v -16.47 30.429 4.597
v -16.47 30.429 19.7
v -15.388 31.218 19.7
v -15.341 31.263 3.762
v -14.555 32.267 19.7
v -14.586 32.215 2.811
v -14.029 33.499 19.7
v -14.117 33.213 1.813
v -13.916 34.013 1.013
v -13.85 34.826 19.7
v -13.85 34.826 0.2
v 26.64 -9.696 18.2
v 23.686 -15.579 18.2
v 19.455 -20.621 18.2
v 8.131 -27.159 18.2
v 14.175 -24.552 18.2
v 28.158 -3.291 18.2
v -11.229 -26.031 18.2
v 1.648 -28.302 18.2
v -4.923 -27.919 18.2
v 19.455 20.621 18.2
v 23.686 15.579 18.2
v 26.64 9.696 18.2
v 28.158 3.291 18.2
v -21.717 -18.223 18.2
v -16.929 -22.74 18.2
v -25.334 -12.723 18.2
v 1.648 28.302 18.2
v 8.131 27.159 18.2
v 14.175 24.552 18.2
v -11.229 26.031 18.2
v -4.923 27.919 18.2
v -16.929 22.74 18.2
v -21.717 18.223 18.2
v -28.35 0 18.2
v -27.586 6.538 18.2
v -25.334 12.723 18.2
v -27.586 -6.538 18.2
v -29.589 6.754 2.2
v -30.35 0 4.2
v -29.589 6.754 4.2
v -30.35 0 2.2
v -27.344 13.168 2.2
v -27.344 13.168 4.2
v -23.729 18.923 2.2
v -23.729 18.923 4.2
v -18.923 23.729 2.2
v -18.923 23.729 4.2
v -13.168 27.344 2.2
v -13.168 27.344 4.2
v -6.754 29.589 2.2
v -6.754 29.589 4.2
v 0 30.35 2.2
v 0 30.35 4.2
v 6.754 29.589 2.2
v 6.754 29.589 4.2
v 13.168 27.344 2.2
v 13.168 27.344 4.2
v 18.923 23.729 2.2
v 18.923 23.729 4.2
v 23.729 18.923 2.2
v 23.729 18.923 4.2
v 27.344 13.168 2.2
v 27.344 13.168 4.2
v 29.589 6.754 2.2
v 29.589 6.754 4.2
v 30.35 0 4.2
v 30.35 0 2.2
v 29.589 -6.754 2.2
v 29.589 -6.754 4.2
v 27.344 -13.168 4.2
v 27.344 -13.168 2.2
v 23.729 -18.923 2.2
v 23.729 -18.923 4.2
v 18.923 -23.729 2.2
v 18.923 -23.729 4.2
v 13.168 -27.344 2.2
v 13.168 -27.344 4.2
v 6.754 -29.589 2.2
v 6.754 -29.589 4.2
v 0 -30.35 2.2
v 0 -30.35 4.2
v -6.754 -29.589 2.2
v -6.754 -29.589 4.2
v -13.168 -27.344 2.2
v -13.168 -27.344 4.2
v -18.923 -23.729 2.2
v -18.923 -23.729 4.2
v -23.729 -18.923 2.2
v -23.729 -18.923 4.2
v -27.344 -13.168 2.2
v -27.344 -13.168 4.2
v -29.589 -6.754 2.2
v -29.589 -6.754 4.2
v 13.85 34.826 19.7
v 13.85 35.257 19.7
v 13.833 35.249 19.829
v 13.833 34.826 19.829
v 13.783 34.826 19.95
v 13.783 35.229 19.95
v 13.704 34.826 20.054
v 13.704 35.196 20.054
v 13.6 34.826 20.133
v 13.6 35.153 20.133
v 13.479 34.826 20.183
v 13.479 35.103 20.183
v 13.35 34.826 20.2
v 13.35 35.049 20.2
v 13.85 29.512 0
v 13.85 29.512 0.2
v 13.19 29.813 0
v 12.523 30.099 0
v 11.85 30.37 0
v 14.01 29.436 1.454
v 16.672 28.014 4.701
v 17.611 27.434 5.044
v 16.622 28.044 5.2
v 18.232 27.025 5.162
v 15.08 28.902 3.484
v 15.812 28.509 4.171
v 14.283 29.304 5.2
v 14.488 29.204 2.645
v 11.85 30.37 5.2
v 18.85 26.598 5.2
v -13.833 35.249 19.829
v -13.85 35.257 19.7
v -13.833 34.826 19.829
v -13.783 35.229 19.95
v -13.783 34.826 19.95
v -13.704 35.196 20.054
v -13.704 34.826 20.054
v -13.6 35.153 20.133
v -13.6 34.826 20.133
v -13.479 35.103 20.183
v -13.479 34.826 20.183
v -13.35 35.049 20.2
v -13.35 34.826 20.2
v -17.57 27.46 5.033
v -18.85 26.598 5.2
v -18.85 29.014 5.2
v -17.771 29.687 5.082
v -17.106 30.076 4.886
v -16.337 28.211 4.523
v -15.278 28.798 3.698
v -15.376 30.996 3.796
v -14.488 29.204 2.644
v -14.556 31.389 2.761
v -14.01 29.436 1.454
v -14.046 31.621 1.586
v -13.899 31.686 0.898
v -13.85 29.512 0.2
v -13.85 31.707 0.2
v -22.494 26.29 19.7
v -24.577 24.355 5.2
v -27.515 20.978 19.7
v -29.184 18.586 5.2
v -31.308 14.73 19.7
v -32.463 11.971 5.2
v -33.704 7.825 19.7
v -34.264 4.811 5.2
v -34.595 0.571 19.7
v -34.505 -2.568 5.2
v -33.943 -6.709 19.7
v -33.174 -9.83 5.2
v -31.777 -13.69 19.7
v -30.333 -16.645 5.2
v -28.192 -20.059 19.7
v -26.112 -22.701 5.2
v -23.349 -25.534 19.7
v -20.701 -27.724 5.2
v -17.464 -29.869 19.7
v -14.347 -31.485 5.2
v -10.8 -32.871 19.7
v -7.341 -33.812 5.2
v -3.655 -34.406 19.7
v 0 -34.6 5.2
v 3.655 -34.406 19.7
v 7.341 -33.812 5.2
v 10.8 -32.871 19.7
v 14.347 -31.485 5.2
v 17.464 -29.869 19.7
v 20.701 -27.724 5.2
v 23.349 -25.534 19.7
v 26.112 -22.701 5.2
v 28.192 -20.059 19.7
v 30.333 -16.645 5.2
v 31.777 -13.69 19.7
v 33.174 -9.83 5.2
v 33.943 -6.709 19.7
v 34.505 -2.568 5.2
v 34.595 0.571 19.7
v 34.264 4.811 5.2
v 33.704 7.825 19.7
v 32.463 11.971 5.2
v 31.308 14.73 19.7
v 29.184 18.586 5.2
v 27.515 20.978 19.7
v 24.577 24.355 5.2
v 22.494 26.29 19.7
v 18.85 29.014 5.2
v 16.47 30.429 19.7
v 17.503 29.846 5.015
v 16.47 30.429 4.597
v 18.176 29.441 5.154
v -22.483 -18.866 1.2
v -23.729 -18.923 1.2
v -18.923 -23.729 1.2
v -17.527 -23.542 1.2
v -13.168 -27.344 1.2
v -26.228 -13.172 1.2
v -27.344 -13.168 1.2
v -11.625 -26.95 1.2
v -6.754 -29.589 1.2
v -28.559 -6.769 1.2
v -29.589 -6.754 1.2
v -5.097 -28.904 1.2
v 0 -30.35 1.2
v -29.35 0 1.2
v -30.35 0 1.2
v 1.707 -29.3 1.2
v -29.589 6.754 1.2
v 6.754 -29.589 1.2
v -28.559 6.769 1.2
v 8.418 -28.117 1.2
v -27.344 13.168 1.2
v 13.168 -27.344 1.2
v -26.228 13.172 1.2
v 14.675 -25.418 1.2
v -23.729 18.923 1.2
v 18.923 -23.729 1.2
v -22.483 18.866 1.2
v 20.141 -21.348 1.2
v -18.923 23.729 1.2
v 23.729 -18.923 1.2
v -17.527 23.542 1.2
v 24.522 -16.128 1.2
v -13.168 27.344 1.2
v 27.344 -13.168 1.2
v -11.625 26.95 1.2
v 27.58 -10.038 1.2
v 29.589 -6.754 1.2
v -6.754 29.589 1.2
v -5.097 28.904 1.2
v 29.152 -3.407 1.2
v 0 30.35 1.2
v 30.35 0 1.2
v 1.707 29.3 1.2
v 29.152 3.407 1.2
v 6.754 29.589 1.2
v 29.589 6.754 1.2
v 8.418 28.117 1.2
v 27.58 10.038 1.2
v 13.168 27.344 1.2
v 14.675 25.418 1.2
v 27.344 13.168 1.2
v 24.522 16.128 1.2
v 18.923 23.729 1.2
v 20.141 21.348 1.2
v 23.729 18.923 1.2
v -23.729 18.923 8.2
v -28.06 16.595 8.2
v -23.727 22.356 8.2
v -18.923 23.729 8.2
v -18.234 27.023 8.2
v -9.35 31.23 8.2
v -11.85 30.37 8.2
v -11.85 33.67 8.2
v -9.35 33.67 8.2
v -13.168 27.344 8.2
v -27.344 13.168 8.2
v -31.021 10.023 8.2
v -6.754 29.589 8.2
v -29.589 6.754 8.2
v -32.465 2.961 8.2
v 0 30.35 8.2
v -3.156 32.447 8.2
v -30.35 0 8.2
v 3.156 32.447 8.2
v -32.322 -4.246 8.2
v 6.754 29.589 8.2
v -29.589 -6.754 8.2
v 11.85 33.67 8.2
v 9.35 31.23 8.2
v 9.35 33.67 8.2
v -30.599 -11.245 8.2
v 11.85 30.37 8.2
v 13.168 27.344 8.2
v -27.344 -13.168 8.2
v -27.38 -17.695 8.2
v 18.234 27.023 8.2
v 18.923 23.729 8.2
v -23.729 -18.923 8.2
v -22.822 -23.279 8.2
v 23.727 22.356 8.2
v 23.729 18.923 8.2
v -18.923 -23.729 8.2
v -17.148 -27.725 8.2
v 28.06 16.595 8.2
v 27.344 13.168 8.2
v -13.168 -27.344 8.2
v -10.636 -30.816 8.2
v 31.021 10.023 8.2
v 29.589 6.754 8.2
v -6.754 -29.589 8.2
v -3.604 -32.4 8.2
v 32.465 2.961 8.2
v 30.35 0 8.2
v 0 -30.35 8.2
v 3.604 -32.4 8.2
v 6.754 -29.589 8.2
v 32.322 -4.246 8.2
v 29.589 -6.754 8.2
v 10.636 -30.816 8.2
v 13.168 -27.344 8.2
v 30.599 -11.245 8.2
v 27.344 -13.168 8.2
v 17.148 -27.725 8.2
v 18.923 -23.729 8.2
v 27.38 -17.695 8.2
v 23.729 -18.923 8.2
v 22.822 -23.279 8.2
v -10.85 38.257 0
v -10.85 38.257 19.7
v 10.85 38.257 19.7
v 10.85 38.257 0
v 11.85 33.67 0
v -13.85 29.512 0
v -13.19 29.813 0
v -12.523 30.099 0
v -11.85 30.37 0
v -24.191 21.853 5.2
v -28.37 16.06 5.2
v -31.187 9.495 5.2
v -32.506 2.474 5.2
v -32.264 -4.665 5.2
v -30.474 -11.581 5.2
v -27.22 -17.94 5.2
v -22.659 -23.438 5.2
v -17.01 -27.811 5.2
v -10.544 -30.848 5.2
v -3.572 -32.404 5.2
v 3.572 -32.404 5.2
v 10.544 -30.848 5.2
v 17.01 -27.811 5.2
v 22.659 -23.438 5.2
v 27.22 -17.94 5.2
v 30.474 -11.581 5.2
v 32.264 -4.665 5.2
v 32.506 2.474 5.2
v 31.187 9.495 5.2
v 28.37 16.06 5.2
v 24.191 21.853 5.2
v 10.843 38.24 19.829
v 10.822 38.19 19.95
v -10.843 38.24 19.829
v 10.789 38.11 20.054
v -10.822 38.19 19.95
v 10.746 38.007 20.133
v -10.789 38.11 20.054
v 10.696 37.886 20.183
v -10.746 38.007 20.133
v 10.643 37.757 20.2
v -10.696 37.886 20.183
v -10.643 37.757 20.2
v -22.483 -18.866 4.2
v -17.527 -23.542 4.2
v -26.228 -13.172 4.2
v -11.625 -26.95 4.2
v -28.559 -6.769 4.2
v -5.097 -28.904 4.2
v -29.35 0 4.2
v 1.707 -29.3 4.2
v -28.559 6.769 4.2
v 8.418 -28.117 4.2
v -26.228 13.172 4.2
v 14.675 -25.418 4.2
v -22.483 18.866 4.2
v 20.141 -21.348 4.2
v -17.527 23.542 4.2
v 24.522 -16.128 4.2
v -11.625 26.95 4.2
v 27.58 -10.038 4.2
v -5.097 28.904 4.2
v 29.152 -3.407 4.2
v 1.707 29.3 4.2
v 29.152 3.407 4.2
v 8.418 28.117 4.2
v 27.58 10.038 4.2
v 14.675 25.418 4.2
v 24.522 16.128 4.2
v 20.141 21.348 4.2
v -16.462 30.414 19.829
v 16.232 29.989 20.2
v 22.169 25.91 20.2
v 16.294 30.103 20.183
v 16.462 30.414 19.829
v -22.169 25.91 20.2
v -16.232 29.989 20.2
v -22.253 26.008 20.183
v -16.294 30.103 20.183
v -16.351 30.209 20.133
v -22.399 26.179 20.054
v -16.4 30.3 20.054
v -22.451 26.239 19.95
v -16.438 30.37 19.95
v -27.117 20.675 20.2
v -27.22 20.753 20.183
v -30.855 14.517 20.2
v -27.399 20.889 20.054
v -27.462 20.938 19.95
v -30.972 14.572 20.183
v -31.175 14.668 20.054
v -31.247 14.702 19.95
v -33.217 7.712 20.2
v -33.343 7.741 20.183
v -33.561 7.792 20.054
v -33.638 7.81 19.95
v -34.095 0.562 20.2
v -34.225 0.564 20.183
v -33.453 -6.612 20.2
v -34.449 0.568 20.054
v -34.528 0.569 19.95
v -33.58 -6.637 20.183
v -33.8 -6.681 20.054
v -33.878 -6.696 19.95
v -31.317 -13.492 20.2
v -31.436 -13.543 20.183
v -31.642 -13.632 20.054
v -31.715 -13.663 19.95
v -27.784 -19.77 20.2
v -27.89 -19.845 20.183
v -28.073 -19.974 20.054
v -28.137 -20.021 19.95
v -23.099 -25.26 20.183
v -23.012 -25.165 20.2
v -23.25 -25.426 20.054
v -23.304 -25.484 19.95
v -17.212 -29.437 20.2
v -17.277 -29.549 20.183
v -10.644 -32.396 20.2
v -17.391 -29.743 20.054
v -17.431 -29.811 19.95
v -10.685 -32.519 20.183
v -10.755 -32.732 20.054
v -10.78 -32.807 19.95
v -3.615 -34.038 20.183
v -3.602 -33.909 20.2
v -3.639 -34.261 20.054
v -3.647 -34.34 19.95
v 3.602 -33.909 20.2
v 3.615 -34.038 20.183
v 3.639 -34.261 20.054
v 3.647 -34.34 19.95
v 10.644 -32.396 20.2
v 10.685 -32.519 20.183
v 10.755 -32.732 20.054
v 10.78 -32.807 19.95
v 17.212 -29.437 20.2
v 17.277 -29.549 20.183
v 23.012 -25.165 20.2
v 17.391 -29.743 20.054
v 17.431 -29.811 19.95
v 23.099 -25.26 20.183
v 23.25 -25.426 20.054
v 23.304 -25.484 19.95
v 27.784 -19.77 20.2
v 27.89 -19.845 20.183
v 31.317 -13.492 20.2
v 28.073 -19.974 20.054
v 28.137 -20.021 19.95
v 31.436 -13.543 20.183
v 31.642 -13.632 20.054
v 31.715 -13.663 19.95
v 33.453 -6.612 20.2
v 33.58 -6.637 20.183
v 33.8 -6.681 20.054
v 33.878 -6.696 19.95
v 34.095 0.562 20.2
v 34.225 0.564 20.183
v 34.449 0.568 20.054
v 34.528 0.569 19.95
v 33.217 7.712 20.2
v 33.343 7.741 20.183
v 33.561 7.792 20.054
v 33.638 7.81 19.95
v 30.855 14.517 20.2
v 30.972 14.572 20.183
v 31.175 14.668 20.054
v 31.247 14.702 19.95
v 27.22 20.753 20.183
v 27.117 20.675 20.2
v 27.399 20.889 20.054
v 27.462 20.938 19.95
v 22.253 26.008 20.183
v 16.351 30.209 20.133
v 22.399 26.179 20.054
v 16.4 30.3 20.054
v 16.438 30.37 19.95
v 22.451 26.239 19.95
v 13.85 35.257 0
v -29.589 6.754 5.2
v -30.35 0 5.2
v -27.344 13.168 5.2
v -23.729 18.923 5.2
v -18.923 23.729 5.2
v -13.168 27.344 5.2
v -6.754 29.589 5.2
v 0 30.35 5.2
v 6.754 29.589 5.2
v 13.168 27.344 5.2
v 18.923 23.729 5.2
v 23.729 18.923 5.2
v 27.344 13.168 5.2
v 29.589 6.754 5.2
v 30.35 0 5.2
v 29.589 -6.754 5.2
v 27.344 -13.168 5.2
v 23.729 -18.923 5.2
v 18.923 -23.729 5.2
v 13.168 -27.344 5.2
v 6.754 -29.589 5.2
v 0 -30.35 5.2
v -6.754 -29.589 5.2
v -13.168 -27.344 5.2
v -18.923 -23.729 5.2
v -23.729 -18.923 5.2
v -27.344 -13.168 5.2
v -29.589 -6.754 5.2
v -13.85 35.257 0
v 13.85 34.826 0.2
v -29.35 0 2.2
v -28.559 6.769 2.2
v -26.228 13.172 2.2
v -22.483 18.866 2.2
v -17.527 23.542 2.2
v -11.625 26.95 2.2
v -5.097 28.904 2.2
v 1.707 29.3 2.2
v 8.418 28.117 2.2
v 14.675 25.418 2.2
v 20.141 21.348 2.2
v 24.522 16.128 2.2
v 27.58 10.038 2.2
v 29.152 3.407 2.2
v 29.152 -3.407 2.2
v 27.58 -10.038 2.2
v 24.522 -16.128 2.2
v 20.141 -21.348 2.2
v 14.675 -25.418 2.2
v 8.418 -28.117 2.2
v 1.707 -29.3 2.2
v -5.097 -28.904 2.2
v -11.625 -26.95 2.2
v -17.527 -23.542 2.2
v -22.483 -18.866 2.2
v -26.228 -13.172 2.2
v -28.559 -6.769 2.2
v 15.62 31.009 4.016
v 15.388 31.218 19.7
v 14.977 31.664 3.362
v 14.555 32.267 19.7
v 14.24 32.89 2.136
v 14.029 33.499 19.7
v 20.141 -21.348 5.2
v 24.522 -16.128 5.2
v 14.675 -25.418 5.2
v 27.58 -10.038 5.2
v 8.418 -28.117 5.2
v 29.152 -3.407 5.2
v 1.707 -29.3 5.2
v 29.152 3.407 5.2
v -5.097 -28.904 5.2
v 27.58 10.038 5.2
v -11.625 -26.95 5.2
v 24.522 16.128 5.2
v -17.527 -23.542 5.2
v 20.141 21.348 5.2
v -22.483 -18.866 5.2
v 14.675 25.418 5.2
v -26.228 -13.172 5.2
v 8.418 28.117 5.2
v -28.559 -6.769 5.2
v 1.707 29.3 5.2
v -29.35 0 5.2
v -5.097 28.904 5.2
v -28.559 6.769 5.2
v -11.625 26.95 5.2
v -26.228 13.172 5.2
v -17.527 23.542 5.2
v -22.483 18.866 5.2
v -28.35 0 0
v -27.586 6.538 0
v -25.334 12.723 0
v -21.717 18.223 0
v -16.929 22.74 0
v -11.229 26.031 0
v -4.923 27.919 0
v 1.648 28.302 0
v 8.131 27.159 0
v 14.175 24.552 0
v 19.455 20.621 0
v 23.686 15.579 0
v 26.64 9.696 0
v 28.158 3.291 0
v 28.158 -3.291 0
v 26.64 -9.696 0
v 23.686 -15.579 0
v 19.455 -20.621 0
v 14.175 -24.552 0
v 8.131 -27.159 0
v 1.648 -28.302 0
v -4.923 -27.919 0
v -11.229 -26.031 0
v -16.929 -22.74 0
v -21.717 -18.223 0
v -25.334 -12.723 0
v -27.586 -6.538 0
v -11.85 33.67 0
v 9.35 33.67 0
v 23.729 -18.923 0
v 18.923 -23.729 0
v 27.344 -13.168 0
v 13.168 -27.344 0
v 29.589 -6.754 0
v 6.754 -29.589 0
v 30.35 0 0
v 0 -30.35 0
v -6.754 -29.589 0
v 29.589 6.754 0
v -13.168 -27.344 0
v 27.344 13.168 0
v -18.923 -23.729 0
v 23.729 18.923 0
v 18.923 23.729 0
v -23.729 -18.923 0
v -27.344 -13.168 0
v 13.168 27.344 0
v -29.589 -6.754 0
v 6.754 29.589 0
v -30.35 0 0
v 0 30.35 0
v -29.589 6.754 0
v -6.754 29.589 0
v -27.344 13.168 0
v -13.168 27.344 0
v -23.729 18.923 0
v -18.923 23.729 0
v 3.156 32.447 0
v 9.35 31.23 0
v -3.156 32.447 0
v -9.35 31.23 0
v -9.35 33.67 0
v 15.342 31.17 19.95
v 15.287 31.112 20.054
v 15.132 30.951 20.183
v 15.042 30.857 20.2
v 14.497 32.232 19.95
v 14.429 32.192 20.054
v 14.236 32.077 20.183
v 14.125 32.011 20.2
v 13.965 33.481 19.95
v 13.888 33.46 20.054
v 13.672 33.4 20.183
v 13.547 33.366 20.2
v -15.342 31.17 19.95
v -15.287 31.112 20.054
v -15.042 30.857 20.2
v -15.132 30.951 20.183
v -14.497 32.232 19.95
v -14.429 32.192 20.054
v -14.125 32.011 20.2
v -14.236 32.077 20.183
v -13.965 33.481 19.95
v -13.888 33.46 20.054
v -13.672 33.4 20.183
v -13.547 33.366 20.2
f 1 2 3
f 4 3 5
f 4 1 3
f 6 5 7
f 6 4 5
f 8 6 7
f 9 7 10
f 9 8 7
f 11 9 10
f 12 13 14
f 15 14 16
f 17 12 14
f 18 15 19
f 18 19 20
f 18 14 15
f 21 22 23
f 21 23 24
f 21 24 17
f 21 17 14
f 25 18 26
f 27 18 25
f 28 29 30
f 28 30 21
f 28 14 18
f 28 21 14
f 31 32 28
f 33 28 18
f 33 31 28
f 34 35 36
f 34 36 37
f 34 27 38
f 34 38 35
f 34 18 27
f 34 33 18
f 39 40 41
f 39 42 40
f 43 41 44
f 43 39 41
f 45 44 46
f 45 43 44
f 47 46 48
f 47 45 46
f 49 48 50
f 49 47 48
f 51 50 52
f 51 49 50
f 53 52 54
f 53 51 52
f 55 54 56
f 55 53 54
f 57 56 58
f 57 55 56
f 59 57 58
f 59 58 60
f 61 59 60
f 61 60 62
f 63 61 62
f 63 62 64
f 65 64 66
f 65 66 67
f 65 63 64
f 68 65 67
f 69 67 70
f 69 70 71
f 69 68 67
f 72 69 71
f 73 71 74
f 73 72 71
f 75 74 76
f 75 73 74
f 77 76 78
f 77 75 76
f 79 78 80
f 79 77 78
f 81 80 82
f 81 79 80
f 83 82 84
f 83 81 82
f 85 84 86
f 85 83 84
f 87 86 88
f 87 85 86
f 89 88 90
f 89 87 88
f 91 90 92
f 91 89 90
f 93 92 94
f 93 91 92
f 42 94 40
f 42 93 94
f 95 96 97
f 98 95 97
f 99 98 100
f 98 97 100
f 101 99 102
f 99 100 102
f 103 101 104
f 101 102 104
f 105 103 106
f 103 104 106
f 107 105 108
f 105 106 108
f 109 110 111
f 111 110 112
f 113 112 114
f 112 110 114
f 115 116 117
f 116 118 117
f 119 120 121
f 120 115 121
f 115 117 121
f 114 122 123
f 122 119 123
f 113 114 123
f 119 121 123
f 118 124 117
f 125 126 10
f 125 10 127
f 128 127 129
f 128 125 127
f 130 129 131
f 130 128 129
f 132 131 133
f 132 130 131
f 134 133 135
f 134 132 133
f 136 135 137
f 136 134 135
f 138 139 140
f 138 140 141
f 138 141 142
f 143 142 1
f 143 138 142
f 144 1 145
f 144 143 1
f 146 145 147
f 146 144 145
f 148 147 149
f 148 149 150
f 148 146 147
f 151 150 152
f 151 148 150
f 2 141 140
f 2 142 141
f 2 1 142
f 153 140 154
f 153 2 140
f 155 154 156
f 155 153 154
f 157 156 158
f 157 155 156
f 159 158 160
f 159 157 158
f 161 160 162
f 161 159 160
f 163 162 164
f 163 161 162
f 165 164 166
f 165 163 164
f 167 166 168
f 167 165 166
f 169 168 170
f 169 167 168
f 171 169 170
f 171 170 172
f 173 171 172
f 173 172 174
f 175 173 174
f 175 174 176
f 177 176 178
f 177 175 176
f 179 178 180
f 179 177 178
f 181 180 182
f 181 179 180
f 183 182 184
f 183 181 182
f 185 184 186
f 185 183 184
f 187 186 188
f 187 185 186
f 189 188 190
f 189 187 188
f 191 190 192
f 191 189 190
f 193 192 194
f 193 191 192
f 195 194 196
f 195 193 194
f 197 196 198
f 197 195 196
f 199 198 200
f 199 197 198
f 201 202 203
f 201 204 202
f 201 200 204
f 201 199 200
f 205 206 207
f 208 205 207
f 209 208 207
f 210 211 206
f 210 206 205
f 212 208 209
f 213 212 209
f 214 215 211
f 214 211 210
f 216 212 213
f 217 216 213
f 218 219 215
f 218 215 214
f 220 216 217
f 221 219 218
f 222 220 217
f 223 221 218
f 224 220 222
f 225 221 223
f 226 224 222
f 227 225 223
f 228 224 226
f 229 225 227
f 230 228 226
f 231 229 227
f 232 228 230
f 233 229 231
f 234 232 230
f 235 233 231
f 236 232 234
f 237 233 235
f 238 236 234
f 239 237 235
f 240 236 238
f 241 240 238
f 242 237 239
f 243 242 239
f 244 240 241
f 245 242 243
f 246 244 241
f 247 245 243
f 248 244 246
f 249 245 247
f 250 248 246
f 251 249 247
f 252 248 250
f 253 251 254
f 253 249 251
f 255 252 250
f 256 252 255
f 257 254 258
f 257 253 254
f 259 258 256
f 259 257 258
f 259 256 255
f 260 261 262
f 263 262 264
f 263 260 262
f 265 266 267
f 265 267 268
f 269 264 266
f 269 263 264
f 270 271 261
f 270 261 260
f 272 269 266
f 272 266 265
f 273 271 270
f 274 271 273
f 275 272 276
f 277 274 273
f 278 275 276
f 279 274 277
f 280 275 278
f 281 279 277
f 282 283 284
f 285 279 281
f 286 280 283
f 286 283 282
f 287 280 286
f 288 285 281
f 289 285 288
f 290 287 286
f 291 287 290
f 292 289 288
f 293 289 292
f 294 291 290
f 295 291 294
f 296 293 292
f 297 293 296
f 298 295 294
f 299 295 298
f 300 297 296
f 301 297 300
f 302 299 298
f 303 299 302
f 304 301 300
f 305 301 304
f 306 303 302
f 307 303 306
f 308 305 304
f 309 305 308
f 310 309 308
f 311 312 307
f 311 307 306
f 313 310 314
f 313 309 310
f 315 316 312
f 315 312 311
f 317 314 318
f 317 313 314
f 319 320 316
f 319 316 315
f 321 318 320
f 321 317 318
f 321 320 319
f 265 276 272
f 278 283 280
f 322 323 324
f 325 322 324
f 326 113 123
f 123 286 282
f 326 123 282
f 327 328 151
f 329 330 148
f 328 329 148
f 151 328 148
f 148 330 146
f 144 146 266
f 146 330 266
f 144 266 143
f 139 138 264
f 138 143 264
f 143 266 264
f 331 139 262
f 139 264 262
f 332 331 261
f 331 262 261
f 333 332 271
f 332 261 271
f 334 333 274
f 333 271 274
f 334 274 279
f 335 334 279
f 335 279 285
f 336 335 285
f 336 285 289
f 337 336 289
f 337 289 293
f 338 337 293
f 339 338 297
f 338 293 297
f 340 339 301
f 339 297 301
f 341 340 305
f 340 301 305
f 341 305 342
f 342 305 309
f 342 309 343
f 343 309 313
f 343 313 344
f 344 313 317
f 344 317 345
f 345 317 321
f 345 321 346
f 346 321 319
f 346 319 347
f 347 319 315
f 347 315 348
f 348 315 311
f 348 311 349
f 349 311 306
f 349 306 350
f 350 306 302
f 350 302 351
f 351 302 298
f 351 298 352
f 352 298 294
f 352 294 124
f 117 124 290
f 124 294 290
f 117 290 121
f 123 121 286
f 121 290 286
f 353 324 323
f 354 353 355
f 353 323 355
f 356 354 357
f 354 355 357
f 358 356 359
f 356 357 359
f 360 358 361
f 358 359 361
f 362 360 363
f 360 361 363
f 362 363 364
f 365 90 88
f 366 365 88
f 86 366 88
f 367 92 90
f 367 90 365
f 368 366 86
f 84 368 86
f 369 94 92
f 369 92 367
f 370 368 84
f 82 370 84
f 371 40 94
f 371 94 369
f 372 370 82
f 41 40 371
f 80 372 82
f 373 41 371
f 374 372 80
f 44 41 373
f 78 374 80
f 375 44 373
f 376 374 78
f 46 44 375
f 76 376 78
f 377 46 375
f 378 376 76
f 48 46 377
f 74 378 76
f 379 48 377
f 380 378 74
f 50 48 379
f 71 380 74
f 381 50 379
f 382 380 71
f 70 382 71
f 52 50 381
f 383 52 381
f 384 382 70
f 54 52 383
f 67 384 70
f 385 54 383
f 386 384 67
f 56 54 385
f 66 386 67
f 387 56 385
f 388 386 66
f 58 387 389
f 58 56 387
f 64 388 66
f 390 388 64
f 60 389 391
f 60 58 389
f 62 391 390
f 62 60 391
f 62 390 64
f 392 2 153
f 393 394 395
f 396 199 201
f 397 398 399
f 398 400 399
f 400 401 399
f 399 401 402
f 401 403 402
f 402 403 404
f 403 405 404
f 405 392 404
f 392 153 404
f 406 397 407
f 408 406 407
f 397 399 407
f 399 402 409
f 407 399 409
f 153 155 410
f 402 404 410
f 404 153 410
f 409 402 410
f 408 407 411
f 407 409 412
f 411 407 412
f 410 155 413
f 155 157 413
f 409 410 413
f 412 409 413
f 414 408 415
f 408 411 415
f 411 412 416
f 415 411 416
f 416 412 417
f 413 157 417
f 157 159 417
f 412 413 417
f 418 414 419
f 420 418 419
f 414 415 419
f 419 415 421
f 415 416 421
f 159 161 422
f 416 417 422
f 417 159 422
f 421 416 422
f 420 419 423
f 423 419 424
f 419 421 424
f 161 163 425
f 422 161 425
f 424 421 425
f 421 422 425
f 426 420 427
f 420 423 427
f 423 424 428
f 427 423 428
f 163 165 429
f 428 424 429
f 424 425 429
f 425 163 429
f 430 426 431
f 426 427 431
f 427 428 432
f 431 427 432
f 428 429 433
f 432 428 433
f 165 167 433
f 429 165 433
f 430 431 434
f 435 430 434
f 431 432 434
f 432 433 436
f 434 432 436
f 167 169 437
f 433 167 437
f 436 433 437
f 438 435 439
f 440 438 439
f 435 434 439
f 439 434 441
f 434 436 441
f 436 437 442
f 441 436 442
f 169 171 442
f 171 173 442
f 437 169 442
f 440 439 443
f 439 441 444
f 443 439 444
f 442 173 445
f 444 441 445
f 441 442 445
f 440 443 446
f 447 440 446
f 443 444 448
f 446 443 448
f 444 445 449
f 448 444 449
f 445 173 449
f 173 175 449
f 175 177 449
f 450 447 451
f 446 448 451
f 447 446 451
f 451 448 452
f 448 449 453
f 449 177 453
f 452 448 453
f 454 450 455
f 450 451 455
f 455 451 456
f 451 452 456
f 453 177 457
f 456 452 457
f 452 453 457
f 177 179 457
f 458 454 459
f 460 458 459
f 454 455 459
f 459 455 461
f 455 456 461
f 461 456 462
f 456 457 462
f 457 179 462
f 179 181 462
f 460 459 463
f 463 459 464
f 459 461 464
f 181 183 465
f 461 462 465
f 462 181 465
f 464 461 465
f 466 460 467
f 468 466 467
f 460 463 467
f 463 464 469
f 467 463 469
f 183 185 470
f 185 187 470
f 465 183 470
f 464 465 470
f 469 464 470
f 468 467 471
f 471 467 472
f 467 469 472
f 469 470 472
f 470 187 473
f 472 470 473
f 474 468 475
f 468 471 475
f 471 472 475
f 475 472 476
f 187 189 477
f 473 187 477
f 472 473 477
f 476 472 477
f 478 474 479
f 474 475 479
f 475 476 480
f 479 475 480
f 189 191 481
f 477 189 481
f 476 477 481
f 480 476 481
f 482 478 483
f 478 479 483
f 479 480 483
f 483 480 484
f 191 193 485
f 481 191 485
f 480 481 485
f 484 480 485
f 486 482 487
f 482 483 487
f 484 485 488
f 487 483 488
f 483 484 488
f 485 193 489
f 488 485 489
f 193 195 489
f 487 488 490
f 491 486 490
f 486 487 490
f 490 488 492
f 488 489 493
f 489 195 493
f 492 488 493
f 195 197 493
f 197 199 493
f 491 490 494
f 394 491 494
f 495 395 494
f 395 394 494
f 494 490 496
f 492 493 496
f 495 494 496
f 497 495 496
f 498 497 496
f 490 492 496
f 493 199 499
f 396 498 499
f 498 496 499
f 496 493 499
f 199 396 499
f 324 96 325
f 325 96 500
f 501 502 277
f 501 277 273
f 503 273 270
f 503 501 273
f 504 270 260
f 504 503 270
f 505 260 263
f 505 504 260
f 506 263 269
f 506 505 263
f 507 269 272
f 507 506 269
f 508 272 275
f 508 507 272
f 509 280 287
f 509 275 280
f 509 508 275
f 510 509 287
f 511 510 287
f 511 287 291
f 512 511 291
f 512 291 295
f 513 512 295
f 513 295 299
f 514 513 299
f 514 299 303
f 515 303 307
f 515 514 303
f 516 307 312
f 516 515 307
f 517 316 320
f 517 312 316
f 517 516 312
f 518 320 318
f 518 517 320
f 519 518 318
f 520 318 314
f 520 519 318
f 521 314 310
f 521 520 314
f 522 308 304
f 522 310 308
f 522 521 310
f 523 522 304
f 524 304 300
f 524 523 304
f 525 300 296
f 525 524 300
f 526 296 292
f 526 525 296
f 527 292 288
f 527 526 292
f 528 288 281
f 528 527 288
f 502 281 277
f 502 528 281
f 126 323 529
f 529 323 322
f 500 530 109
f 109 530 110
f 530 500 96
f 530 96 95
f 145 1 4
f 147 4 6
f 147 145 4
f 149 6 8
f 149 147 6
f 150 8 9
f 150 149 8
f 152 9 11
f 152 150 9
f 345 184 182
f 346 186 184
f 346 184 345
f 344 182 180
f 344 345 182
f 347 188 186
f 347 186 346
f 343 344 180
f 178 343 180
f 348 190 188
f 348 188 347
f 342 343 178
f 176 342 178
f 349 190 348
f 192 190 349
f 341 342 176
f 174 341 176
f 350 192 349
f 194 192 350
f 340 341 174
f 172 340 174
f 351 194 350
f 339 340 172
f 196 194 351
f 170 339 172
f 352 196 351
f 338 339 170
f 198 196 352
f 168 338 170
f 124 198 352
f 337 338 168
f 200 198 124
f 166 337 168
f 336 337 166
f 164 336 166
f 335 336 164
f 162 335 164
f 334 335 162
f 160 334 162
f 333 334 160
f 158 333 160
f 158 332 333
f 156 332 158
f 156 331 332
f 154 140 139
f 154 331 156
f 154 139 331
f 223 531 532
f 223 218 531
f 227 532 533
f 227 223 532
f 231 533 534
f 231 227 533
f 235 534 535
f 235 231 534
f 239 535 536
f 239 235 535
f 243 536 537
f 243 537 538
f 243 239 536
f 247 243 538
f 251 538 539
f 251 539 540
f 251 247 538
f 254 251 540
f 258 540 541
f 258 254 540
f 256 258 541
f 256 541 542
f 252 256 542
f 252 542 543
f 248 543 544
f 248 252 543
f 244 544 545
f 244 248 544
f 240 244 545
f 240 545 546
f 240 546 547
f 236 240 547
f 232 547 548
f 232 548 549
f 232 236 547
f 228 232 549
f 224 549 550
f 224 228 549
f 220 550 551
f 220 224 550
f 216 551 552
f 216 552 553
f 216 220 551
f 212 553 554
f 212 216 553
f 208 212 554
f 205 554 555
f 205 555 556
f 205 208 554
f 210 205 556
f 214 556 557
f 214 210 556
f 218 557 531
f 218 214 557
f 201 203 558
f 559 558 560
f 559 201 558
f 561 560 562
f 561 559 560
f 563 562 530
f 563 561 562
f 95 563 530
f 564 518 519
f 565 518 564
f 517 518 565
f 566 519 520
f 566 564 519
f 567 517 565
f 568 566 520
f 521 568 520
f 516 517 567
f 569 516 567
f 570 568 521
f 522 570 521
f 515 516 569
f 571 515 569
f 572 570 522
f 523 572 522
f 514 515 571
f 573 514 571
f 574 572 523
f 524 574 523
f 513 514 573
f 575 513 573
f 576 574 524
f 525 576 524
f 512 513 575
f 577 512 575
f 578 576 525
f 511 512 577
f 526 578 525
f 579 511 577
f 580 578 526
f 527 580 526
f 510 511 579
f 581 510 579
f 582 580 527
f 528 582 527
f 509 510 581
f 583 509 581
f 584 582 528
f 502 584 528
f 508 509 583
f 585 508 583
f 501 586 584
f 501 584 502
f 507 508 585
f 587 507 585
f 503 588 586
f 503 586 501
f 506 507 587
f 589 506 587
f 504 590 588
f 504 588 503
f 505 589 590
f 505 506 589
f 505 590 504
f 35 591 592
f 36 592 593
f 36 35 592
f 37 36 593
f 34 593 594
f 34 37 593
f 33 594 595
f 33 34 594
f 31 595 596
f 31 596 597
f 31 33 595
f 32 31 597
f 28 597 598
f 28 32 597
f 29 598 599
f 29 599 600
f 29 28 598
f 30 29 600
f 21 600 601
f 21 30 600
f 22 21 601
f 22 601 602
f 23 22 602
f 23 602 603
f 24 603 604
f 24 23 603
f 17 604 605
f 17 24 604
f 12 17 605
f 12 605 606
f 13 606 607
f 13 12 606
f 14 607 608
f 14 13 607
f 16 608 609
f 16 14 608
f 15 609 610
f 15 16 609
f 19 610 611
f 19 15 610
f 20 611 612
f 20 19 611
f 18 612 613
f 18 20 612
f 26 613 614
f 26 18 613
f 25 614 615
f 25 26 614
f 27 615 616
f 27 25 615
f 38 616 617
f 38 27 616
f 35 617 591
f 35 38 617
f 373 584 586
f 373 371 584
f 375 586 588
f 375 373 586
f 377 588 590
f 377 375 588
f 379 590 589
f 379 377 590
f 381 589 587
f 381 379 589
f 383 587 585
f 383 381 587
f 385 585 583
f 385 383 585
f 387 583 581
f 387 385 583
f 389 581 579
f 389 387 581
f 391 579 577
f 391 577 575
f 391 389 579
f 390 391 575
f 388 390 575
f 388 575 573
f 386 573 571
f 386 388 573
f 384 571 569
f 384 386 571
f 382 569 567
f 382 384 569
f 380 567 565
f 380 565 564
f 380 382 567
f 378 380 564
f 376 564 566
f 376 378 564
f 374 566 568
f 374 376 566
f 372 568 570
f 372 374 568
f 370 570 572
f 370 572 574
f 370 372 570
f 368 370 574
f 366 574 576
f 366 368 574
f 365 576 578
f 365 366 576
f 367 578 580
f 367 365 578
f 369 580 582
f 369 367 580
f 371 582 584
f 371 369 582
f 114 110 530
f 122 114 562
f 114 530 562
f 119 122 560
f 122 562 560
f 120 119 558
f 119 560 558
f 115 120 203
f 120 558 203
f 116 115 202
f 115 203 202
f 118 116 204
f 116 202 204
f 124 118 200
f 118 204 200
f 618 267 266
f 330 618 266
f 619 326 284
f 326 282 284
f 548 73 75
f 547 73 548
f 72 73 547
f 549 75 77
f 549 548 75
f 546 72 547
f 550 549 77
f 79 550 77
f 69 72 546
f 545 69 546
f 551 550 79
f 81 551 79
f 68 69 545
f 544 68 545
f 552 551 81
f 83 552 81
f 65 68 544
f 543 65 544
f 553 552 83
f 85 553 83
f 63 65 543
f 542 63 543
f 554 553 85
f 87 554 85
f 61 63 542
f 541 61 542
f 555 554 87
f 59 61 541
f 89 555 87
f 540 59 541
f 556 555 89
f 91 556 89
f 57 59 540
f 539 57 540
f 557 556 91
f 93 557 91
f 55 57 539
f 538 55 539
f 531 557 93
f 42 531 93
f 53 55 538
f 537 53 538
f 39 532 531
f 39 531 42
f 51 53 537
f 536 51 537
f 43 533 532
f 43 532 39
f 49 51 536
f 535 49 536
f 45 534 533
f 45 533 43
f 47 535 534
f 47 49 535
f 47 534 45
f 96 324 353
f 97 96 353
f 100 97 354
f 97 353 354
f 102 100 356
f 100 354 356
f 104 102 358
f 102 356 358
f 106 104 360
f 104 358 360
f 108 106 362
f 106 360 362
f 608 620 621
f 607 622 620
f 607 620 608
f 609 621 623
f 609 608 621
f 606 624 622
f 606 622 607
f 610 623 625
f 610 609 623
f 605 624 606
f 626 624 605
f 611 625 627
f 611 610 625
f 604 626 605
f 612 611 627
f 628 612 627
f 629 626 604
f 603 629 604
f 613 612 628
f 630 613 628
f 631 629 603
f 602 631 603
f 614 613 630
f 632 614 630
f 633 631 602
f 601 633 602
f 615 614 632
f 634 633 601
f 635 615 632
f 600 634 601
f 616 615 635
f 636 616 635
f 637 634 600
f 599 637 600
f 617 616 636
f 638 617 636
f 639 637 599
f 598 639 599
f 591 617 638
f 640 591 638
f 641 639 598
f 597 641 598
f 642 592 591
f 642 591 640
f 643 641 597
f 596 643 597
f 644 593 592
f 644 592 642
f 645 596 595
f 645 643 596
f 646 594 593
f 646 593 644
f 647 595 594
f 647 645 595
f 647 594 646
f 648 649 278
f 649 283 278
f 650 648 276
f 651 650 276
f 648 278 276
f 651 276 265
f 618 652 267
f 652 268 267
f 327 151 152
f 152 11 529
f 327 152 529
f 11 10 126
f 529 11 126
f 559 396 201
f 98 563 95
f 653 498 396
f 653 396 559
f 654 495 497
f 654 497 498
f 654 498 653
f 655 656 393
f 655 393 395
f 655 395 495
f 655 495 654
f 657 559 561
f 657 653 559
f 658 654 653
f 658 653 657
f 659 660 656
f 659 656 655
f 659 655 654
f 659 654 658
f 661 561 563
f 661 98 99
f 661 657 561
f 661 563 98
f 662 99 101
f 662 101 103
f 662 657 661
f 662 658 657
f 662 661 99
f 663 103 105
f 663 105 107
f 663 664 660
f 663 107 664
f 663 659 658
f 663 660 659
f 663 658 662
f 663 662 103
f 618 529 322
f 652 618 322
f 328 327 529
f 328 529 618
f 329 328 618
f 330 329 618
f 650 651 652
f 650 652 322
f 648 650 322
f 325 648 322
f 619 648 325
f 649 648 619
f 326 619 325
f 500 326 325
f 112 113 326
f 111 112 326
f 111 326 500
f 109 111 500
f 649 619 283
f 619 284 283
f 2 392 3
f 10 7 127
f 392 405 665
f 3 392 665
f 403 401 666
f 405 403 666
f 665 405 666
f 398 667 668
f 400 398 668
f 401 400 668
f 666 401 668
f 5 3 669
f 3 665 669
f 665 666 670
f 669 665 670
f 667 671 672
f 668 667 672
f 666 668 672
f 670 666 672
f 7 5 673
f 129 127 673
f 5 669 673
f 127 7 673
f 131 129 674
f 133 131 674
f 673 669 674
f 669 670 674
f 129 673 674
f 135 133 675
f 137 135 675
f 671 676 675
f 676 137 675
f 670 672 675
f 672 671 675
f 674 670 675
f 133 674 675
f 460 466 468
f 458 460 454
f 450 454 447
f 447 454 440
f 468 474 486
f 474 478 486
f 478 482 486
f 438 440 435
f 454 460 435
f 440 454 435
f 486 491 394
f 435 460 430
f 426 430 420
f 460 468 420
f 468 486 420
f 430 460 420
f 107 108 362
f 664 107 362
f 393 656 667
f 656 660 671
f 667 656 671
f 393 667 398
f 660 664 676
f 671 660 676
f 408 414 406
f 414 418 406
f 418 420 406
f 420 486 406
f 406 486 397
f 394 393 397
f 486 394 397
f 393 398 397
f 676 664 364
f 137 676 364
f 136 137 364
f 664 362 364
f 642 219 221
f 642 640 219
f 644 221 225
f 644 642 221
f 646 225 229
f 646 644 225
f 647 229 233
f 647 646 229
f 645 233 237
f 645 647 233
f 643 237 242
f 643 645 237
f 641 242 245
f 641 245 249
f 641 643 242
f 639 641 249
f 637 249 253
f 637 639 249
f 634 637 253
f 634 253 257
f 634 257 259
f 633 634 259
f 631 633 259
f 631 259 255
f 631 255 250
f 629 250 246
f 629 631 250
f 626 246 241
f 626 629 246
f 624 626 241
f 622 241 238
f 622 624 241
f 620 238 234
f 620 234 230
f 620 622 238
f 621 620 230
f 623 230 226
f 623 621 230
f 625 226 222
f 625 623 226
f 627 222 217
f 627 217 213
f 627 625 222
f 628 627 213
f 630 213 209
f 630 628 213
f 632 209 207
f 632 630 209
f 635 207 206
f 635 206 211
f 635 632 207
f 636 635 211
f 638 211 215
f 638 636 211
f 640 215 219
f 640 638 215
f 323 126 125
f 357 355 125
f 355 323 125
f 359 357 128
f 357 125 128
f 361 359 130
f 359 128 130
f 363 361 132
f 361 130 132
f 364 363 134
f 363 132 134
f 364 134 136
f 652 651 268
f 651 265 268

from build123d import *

# Parameters (mm, degrees)
F3_DEPTH      = 15
F4_R          = 30.35
F5_DEPTH      = 12
F8_DEPTH      = 5.2
F9_T1_DEPTH   = 15
F9_T6_DEPTH   = 27.1954073321
F9_S7_R       = 32.6
F9_T8_DEPTH   = 16
F9_S9_R       = 34.6
F9_T10_DEPTH  = 16
F9_T14_DEPTH  = 27.1954073321
F9_S15_R      = 32.6
F9_T16_DEPTH  = 16
F9_S17_R      = 34.6
F9_T18_DEPTH  = 16
F9_T23_DEPTH  = 27.1954073321
F9_S24_R      = 34.6
F9_T25_DEPTH  = 16
F9_T29_DEPTH  = 22.7968974984
F9_T37_DEPTH  = 27.1954073321
F9_S39_R      = 34.6
F9_T40_DEPTH  = 16
F9_T43_DEPTH  = 22.7968974984
F10_SIZE      = 3
F11_T1_DEPTH  = 24.2
F11_T3_DEPTH  = 6.7426406871
F11_T5_DEPTH  = 6.7426406871
F11_T7_DEPTH  = 1.6807325889
F11_T10_ANGLE = 303.1497240065
F11_T12_ANGLE = 61.5748620049
F11_T14_ANGLE = 61.5748620049


# Not quite as in the source:
# - a fillet or chamfer that OpenCascade refuses, or shapes differently, is made with other operations: its cross-section is extruded or revolved along the edge and cut away or added


with BuildPart() as f1:
    # F0 (on Front) → F1 (revolve)
    with BuildSketch(Plane.XZ):
        Polygon((-30.35, 1.2), (-30.35, 0), (-28.35, 0), (-28.35, 18.2), (0, 18.2), (0, 20.2), (-30.35, 20.2), (-32.6, 20.2), (-32.6, 8.2), (-30.35, 8.2), (-30.35, 5.2), (-29.35, 5.2), (-29.35, 4.2), (-30.35, 4.2), (-30.35, 2.2), (-29.35, 2.2), (-29.35, 1.2), align=None)
    revolve(axis=Axis((0, 0, 19.2), (0, 0, -1)))

    # F2 (on face) → F3 (join)
    with BuildSketch(Plane.XY.offset(20.2)):
        with BuildLine():
            Line((-13.85, 38.2565491622), (-13.85, 31.707057574))
            ThreePointArc((-13.85, 31.707057574), (0, -34.6), (13.85, 31.707057574))
            Line((13.85, 31.707057574), (13.85, 38.2565491622))
            Line((13.85, 38.2565491622), (-13.85, 38.2565491622))
        make_face()
        with BuildLine():
            ThreePointArc((11.85, 30.3700098782), (0, -32.6), (-11.85, 30.3700098782))
            Line((-11.85, 30.3700098782), (-11.85, 33.6700098782))
            Line((-11.85, 33.6700098782), (-9.35, 33.6700098782))
            Line((-9.35, 33.6700098782), (-9.35, 31.2303938496))
            ThreePointArc((-9.35, 31.2303938496), (0, 32.6), (9.35, 31.2303938496))
            Line((9.35, 31.2303938496), (9.35, 33.6700098782))
            Line((9.35, 33.6700098782), (11.85, 33.6700098782))
            Line((11.85, 33.6700098782), (11.85, 30.3700098782))
        make_face(mode=Mode.SUBTRACT)
    extrude(amount=-F3_DEPTH)

    # F4 (on face) → F5 (join)
    with BuildSketch(Plane(origin=(0, 0, 8.2), x_dir=(1, 0, 0), z_dir=(0, 0, -1))):
        with BuildLine():
            ThreePointArc((13.85, -31.707057574), (0, 34.6), (-13.85, -31.707057574))
            Line((-13.85, -31.707057574), (-13.85, -38.2565491622))
            Line((-13.85, -38.2565491622), (13.85, -38.2565491622))
            Line((13.85, -38.2565491622), (13.85, -31.707057574))
        make_face()
        Circle(F4_R, mode=Mode.SUBTRACT)
    extrude(amount=-F5_DEPTH)

    # F7 (on face) → F8 (join, through all)
    with BuildSketch(Plane(origin=(0, 0, 5.2), x_dir=(1, 0, 0), z_dir=(0, 0, -1))):
        with BuildLine():
            Line((-13.85, -29.5116502419), (-13.85, -38.2565491622))
            Line((-13.85, -38.2565491622), (13.85, -38.2565491622))
            Line((13.85, -38.2565491622), (13.85, -29.5116502419))
            ThreePointArc((13.85, -29.5116502419), (12.8571651353, -29.9575250093), (11.85, -30.3700098782))
            Line((11.85, -30.3700098782), (11.85, -33.6700098782))
            Line((11.85, -33.6700098782), (9.35, -33.6700098782))
            Line((9.35, -33.6700098782), (9.35, -31.2303938496))
            ThreePointArc((9.35, -31.2303938496), (0, -32.6), (-9.35, -31.2303938496))
            Line((-9.35, -31.2303938496), (-9.35, -33.6700098782))
            Line((-9.35, -33.6700098782), (-11.85, -33.6700098782))
            Line((-11.85, -33.6700098782), (-11.85, -30.3700098782))
            ThreePointArc((-11.85, -30.3700098782), (-12.8571651353, -29.9575250093), (-13.85, -29.5116502419))
        make_face()
    extrude(amount=F8_DEPTH)

    # F9: fillet of radius 5 on 4 edges, made by hand

    # F9_s2 → F9_t1 (join)
    with BuildSketch(Plane.XY.offset(5.2)):
        with BuildLine():
            ThreePointArc((-16.4699494949, 30.4286175111), (-14.5546389834, 32.2665444625), (-13.85, 34.8258165733))
            Line((-13.85, 34.8258165733), (-13.85, 31.707057574))
            ThreePointArc((-13.85, 31.707057574), (-15.1734451129, 31.0954428077), (-16.4699494949, 30.4286175111))
        make_face()
        with BuildLine():
            ThreePointArc((16.4699494949, 30.4286175111), (14.5546389834, 32.2665444625), (13.85, 34.8258165733))
            Line((13.85, 34.8258165733), (13.85, 31.707057574))
            ThreePointArc((13.85, 31.707057574), (15.1734451129, 31.0954428077), (16.4699494949, 30.4286175111))
        make_face()
    extrude(amount=F9_T1_DEPTH)


with BuildPart() as f9_tool4:
    # F9_s5 → F9_t6 (new body)
    with BuildSketch(Plane.XZ.offset(-44.207057574)):
        with BuildLine():
            ThreePointArc((13.85, 0.2), (15.3144660941, 3.7355339059), (18.85, 5.2))
            Line((18.85, 5.2), (13.85, 5.2))
            Line((13.85, 5.2), (13.85, 0.2))
        make_face()
    extrude(amount=F9_T6_DEPTH)

    # F9_s7 → F9_t8 (cut, symmetric)
    with BuildSketch(Plane.XY.offset(2.7)):
        Circle(F9_S7_R)
    extrude(amount=F9_T8_DEPTH, both=True, mode=Mode.SUBTRACT)

    # F9_s9 → F9_t10 (intersect, symmetric)
    with BuildSketch(Plane.XY.offset(2.7)):
        Circle(F9_S9_R)
    extrude(amount=F9_T10_DEPTH, both=True, mode=Mode.INTERSECT)


with BuildPart() as f1_1:
    add(f1.part)

    # F9_t3: union F9_tool4
    add(f9_tool4.part)


with BuildPart() as f9_tool12:
    # F9_s13 → F9_t14 (new body)
    with BuildSketch(Plane.XZ.offset(-17.0116502419)):
        with BuildLine():
            ThreePointArc((-18.85, 5.2), (-15.3144660941, 3.7355339059), (-13.85, 0.2))
            Line((-13.85, 0.2), (-13.85, 5.2))
            Line((-13.85, 5.2), (-18.85, 5.2))
        make_face()
    extrude(amount=-F9_T14_DEPTH)

    # F9_s15 → F9_t16 (cut, symmetric)
    with BuildSketch(Plane.XY.offset(2.7)):
        Circle(F9_S15_R)
    extrude(amount=F9_T16_DEPTH, both=True, mode=Mode.SUBTRACT)

    # F9_s17 → F9_t18 (intersect, symmetric)
    with BuildSketch(Plane.XY.offset(2.7)):
        Circle(F9_S17_R)
    extrude(amount=F9_T18_DEPTH, both=True, mode=Mode.INTERSECT)


with BuildPart() as f1_2:
    add(f1_1.part)

    # F9_t11: union F9_tool12
    add(f9_tool12.part)


with BuildPart() as f9_tool21:
    # F9_s22 → F9_t23 (new body)
    with BuildSketch(Plane.XZ.offset(-17.0116502419)):
        with BuildLine():
            ThreePointArc((-18.85, 5.2), (-15.3144660941, 3.7355339059), (-13.85, 0.2))
            Line((-13.85, 0.2), (-13.85, 5.2))
            Line((-13.85, 5.2), (-18.85, 5.2))
        make_face()
    extrude(amount=-F9_T23_DEPTH)

    # F9_s24 → F9_t25 (cut, symmetric)
    with BuildSketch(Plane.XY.offset(2.7)):
        Circle(F9_S24_R)
    extrude(amount=F9_T25_DEPTH, both=True, mode=Mode.SUBTRACT)

    split(bisect_by=Plane.XZ.offset(-38.2565491622), keep=Keep.TOP)


with BuildPart() as f9_tool27:
    # F9_s28 → F9_t29 (new body)
    with BuildSketch(Plane.XY.offset(-2.5968974984)):
        with BuildLine():
            ThreePointArc((-16.4699494949, 30.4286175111), (-14.5546389834, 32.2665444625), (-13.85, 34.8258165733))
            Line((-13.85, 34.8258165733), (-13.85, 31.707057574))
            ThreePointArc((-13.85, 31.707057574), (-15.1734451129, 31.0954428077), (-16.4699494949, 30.4286175111))
        make_face()
    extrude(amount=F9_T29_DEPTH)

    split(bisect_by=Plane.XY, keep=Keep.TOP)

    split(bisect_by=Plane.XY.offset(5.2), keep=Keep.BOTTOM)


with BuildPart() as f9_tool21_1:
    add(f9_tool21.part)

    # F9_t32: intersect F9_tool27
    add(f9_tool27.part, mode=Mode.INTERSECT)


with BuildPart() as f1_3:
    add(f1_2.part)

    # F9_t19: union F9_tool21
    add(f9_tool21_1.part)


with BuildPart() as f9_tool35:
    # F9_s36 → F9_t37 (new body)
    with BuildSketch(Plane.XZ.offset(-44.207057574)):
        with BuildLine():
            ThreePointArc((13.85, 0.2), (15.3144660941, 3.7355339059), (18.85, 5.2))
            Line((18.85, 5.2), (13.85, 5.2))
            Line((13.85, 5.2), (13.85, 0.2))
        make_face()
    extrude(amount=F9_T37_DEPTH)

    split(bisect_by=Plane.XZ.offset(-38.2565491622), keep=Keep.TOP)

    # F9_s39 → F9_t40 (cut, symmetric)
    with BuildSketch(Plane.XY.offset(2.7)):
        Circle(F9_S39_R)
    extrude(amount=F9_T40_DEPTH, both=True, mode=Mode.SUBTRACT)


with BuildPart() as f9_tool41:
    # F9_s42 → F9_t43 (new body)
    with BuildSketch(Plane.XY.offset(20.2)):
        with BuildLine():
            ThreePointArc((16.4699494949, 30.4286175111), (14.5546389834, 32.2665444625), (13.85, 34.8258165733))
            Line((13.85, 34.8258165733), (13.85, 31.707057574))
            ThreePointArc((13.85, 31.707057574), (15.1734451129, 31.0954428077), (16.4699494949, 30.4286175111))
        make_face()
    extrude(amount=-F9_T43_DEPTH)

    split(bisect_by=Plane.XY, keep=Keep.TOP)

    split(bisect_by=Plane.XY.offset(5.2), keep=Keep.BOTTOM)


with BuildPart() as f9_tool35_1:
    add(f9_tool35.part)

    # F9_t46: intersect F9_tool41
    add(f9_tool41.part, mode=Mode.INTERSECT)


with BuildPart() as f1_4:
    add(f1_3.part)

    # F9_t33: union F9_tool35
    add(f9_tool35_1.part)

    # F10
    f10_edges = [f1_4.edges().sort_by_distance(p)[0] for p in [
        (13.85, 38.256549, 12.7),
        (13.85, 38.256549, 2.6),
        (-13.85, 38.256549, 12.7),
        (-13.85, 38.256549, 2.6),
    ]]
    chamfer(f10_edges, length=F10_SIZE)

    # F11: fillet of radius 0.5 on 8 edges, made by hand

    # F11_s2 → F11_t1 (cut)
    with BuildSketch(Plane.YZ.offset(-12.1)):
        with BuildLine():
            ThreePointArc((38.2565491622, 19.7), (38.1101025528, 20.0535533906), (37.7565491622, 20.2))
            Line((37.7565491622, 20.2), (38.2565491622, 20.2))
            Line((38.2565491622, 20.2), (38.2565491622, 19.7))
        make_face()
    extrude(amount=F11_T1_DEPTH, mode=Mode.SUBTRACT)

    # F11_s4 → F11_t3 (cut)
    with BuildSketch(Plane(origin=(9.8193911046, 9.8193911046, 0), x_dir=(0, 0, 1), z_dir=(0.7071067812, 0.7071067812, 0))):
        with BuildLine():
            ThreePointArc((19.7, -34.7235739133), (20.0535533906, -34.5771273039), (20.2, -34.2235739133))
            Line((20.2, -34.2235739133), (20.2, -34.7235739133))
            Line((20.2, -34.7235739133), (19.7, -34.7235739133))
        make_face()
    extrude(amount=F11_T3_DEPTH, mode=Mode.SUBTRACT)

    # F11_s6 → F11_t5 (cut)
    with BuildSketch(Plane(origin=(-14.5871580576, 14.5871580576, 0), x_dir=(0, 0, 1), z_dir=(0.7071067812, -0.7071067812, 0))):
        with BuildLine():
            ThreePointArc((19.7, -34.7235739133), (20.0535533906, -34.5771273039), (20.2, -34.2235739133))
            Line((20.2, -34.2235739133), (20.2, -34.7235739133))
            Line((20.2, -34.7235739133), (19.7, -34.7235739133))
        make_face()
    extrude(amount=F11_T5_DEPTH, mode=Mode.SUBTRACT)

    # F11_s8 → F11_t7 (cut)
    with BuildSketch(Plane.XZ.offset(-36.5065491622)):
        with BuildLine():
            ThreePointArc((-13.85, 19.7), (-13.7035533906, 20.0535533906), (-13.35, 20.2))
            Line((-13.35, 20.2), (-13.85, 20.2))
            Line((-13.85, 20.2), (-13.85, 19.7))
        make_face()
        with BuildLine():
            ThreePointArc((13.85, 19.7), (13.7035533906, 20.0535533906), (13.35, 20.2))
            Line((13.35, 20.2), (13.85, 20.2))
            Line((13.85, 20.2), (13.85, 19.7))
        make_face()
    extrude(amount=F11_T7_DEPTH, mode=Mode.SUBTRACT)

    # F11_s9 → F11_t10 (revolve, cut)
    with BuildSketch(Plane(origin=(0, 0, 0), x_dir=(0, 0, 1), z_dir=(0.8794398125, 0.476010101, 0))):
        with BuildLine():
            ThreePointArc((20.2, -34.1), (20.0535533906, -34.4535533906), (19.7, -34.6))
            Line((19.7, -34.6), (20.2, -34.6))
            Line((20.2, -34.6), (20.2, -34.1))
        make_face()
    revolve(axis=Axis((0, 0, 20.2), (0, 0, 1)), revolution_arc=F11_T10_ANGLE, mode=Mode.SUBTRACT)

    # F11_s11 → F11_t12 (revolve, cut)
    with BuildSketch(Plane(origin=(-4e-10, -2e-10, 0), x_dir=(0, 0, 1), z_dir=(-0.8794398125, -0.476010101, 0))):
        with BuildLine():
            ThreePointArc((19.7, 34.6), (20.0535533906, 34.4535533906), (20.2, 34.1))
            Line((20.2, 34.1), (20.2, 34.6))
            Line((20.2, 34.6), (19.7, 34.6))
        make_face()
    revolve(axis=Axis((-18.8499999998, 34.8258165732, 20.2), (0, 0, 1)), revolution_arc=F11_T12_ANGLE, mode=Mode.SUBTRACT)

    # F11_s13 → F11_t14 (revolve, cut)
    with BuildSketch(Plane(origin=(4e-10, -2e-10, 0), x_dir=(0, 0, 1), z_dir=(0.8794398125, -0.476010101, 0))):
        with BuildLine():
            ThreePointArc((19.7, -34.6), (20.0535533906, -34.4535533906), (20.2, -34.1))
            Line((20.2, -34.1), (20.2, -34.6))
            Line((20.2, -34.6), (19.7, -34.6))
        make_face()
    revolve(axis=Axis((18.8499999998, 34.8258165732, 20.2), (0, 0, -1)), revolution_arc=F11_T14_ANGLE, mode=Mode.SUBTRACT)


solid = f1_4.part
